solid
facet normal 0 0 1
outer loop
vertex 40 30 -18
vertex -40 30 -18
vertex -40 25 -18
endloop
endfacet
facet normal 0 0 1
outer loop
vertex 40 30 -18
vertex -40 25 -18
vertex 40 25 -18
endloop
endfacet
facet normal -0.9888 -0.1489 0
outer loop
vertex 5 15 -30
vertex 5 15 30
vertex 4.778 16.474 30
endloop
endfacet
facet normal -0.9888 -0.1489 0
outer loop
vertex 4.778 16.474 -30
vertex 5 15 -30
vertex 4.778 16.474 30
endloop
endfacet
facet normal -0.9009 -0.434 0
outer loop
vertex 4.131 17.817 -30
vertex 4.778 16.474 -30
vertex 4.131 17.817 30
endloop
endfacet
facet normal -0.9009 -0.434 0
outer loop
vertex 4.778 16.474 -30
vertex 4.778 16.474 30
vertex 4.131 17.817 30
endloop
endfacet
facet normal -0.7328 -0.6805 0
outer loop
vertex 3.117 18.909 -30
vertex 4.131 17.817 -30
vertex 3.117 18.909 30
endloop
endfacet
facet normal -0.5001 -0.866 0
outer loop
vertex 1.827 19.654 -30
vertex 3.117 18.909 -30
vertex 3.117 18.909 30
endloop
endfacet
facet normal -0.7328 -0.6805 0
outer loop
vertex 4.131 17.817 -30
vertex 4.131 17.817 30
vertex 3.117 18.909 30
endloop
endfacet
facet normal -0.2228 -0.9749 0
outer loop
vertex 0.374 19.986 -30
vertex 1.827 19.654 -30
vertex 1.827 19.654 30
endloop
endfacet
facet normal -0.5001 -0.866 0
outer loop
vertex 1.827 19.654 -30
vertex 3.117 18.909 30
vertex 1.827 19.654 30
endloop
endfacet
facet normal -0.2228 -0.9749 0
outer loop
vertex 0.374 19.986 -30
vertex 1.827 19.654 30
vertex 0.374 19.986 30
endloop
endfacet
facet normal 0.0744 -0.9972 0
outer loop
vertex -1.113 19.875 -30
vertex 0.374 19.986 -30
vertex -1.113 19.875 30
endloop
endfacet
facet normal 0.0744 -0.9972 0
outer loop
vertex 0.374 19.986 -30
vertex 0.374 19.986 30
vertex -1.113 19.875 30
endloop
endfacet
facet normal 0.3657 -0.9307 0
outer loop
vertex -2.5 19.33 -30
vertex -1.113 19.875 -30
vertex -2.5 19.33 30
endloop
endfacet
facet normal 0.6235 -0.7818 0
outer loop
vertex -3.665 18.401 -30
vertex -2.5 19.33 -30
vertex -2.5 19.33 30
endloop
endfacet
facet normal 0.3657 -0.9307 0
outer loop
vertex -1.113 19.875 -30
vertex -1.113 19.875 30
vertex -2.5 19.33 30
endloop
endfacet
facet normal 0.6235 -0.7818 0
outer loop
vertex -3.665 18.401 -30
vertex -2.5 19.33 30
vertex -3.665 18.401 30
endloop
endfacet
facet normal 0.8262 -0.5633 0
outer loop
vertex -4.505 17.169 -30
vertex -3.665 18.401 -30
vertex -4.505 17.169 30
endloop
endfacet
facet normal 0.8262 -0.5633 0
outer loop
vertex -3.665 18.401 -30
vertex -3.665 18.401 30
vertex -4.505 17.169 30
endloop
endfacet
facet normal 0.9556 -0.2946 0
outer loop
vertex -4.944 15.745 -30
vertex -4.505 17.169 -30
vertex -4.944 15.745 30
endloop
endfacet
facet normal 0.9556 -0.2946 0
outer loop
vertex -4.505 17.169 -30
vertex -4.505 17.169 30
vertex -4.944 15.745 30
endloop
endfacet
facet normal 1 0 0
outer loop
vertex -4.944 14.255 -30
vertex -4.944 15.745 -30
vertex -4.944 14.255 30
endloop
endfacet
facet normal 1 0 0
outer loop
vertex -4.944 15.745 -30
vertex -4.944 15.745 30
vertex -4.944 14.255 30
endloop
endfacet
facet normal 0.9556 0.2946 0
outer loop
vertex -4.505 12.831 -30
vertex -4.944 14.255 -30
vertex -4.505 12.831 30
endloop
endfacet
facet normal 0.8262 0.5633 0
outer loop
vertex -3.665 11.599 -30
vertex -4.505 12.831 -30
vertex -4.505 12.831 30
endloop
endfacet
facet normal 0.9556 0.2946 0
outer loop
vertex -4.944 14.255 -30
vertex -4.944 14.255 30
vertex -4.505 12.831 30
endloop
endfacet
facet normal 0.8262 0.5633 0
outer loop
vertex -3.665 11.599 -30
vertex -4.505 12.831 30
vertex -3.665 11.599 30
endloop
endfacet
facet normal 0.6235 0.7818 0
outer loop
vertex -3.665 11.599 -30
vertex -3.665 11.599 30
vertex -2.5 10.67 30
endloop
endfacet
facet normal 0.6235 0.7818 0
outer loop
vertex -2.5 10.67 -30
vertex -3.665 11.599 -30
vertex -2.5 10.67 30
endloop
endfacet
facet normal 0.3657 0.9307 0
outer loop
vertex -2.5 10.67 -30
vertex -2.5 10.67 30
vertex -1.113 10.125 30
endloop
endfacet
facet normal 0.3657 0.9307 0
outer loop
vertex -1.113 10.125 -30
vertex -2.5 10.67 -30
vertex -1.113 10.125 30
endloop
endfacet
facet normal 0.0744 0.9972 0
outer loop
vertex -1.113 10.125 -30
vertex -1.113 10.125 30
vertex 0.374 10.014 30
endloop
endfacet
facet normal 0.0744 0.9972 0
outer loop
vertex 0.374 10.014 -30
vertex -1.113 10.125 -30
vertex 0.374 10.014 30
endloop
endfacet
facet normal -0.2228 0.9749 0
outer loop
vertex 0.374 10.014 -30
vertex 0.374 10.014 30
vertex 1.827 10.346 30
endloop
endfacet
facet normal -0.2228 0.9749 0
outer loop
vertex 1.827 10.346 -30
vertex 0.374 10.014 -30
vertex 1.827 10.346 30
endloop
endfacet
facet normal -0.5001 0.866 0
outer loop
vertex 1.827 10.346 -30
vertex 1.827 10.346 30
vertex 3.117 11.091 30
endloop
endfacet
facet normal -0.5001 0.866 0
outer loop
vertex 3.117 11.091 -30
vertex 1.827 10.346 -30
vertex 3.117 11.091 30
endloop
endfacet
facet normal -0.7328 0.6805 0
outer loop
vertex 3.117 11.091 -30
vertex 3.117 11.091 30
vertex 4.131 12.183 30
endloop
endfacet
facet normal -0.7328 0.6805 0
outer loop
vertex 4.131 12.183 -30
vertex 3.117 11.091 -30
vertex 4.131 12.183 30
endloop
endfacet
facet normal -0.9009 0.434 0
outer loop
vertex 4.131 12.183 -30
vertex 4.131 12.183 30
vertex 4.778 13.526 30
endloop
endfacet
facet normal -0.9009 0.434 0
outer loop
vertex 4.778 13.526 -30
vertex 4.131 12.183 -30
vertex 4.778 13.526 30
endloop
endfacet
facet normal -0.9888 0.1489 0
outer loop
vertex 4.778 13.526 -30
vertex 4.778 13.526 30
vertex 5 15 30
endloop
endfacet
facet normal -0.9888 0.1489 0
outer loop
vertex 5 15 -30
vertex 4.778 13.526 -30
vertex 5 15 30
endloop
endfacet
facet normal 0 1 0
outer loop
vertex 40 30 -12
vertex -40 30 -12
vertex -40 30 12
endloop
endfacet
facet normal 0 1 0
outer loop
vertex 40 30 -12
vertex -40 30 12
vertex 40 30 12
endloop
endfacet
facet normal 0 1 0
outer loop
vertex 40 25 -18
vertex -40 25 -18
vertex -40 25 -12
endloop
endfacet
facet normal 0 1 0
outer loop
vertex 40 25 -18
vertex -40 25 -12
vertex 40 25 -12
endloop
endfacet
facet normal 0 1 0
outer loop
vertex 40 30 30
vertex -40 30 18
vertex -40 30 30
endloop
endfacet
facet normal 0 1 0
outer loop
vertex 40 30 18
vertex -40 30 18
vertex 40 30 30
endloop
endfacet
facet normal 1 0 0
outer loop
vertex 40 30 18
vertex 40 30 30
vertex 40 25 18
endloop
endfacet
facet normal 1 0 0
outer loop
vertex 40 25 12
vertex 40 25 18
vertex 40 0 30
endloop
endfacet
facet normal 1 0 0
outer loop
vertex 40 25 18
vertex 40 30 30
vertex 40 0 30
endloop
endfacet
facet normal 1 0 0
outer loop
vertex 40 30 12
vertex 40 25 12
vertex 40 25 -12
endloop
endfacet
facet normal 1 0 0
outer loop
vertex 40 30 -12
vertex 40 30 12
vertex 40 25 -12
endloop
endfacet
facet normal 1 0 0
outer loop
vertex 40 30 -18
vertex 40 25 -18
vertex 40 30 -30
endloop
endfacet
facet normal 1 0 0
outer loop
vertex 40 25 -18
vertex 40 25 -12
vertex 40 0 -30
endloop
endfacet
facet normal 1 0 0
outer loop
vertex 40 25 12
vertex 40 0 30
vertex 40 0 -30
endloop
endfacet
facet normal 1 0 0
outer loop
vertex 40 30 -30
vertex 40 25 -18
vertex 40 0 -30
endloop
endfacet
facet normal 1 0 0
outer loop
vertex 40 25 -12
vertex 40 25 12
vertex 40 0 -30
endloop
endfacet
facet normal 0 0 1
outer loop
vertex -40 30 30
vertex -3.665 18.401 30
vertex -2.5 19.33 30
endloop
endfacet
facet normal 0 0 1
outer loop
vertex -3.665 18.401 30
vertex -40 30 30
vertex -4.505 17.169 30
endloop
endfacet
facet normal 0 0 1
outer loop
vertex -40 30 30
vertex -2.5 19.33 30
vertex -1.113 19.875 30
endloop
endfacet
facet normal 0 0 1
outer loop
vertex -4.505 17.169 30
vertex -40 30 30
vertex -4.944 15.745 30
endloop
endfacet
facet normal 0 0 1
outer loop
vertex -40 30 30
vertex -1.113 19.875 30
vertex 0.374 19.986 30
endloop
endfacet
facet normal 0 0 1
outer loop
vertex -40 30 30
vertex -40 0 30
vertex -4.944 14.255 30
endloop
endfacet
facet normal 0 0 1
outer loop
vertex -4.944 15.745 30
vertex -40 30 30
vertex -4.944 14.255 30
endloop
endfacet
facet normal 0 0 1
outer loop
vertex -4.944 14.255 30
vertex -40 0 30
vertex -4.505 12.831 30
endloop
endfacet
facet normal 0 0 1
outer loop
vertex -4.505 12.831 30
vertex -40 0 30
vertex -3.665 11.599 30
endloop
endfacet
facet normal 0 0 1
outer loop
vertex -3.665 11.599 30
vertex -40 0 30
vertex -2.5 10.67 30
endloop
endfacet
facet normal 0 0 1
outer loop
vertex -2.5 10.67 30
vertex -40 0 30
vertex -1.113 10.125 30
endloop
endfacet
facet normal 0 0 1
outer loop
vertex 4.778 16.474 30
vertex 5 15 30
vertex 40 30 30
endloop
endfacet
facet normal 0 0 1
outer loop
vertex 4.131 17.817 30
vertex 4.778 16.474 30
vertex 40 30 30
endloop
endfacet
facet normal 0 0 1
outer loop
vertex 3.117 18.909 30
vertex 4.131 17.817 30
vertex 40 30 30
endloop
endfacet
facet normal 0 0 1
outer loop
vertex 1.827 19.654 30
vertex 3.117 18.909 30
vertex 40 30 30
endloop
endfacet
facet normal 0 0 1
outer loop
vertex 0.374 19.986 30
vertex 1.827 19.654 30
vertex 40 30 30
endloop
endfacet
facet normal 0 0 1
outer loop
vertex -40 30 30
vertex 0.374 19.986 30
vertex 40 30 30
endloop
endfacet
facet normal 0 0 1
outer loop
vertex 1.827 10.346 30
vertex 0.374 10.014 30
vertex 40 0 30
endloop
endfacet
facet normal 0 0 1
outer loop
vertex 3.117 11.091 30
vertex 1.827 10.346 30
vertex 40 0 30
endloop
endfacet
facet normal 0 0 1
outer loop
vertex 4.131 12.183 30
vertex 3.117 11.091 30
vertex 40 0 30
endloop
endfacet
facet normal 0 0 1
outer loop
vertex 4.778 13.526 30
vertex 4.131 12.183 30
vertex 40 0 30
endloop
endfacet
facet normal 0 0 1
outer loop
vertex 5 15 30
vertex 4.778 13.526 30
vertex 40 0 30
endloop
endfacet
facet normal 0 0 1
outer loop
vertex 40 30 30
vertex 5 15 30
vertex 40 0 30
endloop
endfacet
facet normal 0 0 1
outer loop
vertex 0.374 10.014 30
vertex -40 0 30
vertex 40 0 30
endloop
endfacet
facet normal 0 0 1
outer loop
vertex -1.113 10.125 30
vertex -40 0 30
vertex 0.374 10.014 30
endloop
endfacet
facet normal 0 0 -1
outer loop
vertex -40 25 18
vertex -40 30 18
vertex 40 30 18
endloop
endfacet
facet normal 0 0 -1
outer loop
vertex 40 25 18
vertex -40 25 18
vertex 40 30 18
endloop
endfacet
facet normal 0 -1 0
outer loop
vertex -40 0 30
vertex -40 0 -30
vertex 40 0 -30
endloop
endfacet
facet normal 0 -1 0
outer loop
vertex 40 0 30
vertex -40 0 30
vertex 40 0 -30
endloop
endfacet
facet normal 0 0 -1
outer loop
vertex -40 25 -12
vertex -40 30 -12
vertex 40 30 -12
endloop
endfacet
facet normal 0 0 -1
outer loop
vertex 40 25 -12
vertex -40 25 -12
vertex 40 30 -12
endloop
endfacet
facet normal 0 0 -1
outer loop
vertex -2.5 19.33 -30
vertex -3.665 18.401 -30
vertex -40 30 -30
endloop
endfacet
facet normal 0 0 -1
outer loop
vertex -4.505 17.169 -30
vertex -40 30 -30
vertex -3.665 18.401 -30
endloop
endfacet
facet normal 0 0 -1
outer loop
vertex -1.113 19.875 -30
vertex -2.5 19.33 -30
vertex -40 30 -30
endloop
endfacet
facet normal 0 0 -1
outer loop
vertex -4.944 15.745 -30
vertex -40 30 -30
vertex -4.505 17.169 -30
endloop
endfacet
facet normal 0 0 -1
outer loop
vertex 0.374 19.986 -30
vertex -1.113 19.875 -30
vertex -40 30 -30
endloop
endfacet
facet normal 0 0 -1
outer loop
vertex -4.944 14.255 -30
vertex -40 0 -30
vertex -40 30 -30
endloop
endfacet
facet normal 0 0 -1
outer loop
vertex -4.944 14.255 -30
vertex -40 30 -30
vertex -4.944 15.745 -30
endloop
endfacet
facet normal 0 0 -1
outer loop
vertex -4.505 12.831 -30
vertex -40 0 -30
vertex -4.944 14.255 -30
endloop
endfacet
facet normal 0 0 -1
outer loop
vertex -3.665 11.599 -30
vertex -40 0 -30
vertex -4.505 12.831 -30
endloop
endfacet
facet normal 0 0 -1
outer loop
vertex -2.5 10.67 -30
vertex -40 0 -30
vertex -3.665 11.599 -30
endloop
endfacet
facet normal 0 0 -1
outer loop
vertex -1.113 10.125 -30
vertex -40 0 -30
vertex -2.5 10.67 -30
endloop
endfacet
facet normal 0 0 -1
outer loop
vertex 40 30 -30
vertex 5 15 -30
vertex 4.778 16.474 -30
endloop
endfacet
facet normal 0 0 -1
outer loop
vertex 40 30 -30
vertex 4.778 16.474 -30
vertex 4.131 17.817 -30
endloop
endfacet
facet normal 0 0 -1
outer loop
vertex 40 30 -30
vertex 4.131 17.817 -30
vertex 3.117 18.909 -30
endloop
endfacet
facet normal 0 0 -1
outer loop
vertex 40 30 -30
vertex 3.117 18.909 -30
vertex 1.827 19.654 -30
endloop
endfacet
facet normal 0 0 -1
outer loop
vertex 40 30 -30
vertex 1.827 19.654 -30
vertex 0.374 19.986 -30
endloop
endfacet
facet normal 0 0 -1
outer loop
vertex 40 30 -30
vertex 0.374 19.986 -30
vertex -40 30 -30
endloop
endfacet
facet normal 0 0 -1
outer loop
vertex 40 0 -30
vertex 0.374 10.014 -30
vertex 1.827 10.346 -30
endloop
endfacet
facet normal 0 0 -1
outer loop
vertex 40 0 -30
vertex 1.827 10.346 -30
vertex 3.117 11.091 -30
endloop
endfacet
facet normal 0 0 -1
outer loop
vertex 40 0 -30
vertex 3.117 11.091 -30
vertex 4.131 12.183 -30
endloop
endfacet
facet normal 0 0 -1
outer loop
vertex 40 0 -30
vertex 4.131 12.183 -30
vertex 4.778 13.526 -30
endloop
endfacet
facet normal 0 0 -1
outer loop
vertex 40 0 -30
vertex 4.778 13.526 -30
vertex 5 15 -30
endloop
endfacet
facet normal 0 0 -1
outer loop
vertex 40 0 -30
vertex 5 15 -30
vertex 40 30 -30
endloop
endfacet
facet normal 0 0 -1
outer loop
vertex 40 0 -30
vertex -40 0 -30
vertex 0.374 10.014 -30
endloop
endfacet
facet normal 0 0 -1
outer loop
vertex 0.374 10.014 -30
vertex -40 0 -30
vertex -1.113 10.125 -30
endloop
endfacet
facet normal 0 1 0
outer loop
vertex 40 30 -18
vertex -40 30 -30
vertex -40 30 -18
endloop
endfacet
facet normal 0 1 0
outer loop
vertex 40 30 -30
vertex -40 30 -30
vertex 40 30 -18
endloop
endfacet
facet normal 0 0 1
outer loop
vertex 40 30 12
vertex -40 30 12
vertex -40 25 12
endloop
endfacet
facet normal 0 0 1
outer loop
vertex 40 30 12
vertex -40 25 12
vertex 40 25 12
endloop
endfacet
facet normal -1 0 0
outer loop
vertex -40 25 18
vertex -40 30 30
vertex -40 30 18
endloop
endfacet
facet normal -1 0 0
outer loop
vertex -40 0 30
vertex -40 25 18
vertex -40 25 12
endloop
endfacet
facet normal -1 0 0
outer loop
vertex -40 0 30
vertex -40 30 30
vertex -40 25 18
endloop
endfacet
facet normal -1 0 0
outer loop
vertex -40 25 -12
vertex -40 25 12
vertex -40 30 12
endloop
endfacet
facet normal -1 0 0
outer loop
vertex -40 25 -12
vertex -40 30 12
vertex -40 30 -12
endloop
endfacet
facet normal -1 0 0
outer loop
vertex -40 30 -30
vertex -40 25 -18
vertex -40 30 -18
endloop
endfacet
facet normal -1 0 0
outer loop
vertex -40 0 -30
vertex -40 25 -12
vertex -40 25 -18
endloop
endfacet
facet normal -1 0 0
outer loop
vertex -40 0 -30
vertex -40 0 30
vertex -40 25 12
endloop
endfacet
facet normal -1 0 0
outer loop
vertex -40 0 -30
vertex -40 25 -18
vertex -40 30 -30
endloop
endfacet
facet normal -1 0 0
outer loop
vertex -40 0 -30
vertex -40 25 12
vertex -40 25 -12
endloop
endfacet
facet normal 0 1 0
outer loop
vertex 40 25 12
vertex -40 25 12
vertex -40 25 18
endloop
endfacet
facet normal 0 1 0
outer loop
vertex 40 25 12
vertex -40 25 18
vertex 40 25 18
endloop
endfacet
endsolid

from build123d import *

# Parameters (mm, degrees)
SKETCH_1_W          = 80
SKETCH_1_H          = 60
EXTRUDE_1_DEPTH     = 30
SKETCH_2_R          = 5
CUT_EXTRUDE_1_DEPTH = 61
SKETCH_3_W          = 80
SKETCH_3_H          = 6
CUT_EXTRUDE_2_DEPTH = 5


with BuildPart() as part:
    # 草图1 → 凸台-拉伸1 (new body)
    with BuildSketch(Plane(origin=(0, 0, 0), x_dir=(1, 0, 0), z_dir=(0, 1, 0))):
        Rectangle(SKETCH_1_W, SKETCH_1_H)
    extrude(amount=EXTRUDE_1_DEPTH)

    # 草图2 → 切除-拉伸1 (cut, through all)
    with BuildSketch(Plane.XY.offset(30)):
        with Locations((0, 15)):
            Circle(SKETCH_2_R)
    extrude(amount=-CUT_EXTRUDE_1_DEPTH, mode=Mode.SUBTRACT)

    # 草图3 → 切除-拉伸2 (cut)
    with BuildSketch(Plane(origin=(0, 30, 0), x_dir=(1, 0, 0), z_dir=(0, 1, 0))):
        with Locations((0, 15)):
            Rectangle(SKETCH_3_W, SKETCH_3_H)
        with Locations((0, -15)):
            Rectangle(SKETCH_3_W, SKETCH_3_H)
    extrude(amount=-CUT_EXTRUDE_2_DEPTH, mode=Mode.SUBTRACT)


solid = part.part
